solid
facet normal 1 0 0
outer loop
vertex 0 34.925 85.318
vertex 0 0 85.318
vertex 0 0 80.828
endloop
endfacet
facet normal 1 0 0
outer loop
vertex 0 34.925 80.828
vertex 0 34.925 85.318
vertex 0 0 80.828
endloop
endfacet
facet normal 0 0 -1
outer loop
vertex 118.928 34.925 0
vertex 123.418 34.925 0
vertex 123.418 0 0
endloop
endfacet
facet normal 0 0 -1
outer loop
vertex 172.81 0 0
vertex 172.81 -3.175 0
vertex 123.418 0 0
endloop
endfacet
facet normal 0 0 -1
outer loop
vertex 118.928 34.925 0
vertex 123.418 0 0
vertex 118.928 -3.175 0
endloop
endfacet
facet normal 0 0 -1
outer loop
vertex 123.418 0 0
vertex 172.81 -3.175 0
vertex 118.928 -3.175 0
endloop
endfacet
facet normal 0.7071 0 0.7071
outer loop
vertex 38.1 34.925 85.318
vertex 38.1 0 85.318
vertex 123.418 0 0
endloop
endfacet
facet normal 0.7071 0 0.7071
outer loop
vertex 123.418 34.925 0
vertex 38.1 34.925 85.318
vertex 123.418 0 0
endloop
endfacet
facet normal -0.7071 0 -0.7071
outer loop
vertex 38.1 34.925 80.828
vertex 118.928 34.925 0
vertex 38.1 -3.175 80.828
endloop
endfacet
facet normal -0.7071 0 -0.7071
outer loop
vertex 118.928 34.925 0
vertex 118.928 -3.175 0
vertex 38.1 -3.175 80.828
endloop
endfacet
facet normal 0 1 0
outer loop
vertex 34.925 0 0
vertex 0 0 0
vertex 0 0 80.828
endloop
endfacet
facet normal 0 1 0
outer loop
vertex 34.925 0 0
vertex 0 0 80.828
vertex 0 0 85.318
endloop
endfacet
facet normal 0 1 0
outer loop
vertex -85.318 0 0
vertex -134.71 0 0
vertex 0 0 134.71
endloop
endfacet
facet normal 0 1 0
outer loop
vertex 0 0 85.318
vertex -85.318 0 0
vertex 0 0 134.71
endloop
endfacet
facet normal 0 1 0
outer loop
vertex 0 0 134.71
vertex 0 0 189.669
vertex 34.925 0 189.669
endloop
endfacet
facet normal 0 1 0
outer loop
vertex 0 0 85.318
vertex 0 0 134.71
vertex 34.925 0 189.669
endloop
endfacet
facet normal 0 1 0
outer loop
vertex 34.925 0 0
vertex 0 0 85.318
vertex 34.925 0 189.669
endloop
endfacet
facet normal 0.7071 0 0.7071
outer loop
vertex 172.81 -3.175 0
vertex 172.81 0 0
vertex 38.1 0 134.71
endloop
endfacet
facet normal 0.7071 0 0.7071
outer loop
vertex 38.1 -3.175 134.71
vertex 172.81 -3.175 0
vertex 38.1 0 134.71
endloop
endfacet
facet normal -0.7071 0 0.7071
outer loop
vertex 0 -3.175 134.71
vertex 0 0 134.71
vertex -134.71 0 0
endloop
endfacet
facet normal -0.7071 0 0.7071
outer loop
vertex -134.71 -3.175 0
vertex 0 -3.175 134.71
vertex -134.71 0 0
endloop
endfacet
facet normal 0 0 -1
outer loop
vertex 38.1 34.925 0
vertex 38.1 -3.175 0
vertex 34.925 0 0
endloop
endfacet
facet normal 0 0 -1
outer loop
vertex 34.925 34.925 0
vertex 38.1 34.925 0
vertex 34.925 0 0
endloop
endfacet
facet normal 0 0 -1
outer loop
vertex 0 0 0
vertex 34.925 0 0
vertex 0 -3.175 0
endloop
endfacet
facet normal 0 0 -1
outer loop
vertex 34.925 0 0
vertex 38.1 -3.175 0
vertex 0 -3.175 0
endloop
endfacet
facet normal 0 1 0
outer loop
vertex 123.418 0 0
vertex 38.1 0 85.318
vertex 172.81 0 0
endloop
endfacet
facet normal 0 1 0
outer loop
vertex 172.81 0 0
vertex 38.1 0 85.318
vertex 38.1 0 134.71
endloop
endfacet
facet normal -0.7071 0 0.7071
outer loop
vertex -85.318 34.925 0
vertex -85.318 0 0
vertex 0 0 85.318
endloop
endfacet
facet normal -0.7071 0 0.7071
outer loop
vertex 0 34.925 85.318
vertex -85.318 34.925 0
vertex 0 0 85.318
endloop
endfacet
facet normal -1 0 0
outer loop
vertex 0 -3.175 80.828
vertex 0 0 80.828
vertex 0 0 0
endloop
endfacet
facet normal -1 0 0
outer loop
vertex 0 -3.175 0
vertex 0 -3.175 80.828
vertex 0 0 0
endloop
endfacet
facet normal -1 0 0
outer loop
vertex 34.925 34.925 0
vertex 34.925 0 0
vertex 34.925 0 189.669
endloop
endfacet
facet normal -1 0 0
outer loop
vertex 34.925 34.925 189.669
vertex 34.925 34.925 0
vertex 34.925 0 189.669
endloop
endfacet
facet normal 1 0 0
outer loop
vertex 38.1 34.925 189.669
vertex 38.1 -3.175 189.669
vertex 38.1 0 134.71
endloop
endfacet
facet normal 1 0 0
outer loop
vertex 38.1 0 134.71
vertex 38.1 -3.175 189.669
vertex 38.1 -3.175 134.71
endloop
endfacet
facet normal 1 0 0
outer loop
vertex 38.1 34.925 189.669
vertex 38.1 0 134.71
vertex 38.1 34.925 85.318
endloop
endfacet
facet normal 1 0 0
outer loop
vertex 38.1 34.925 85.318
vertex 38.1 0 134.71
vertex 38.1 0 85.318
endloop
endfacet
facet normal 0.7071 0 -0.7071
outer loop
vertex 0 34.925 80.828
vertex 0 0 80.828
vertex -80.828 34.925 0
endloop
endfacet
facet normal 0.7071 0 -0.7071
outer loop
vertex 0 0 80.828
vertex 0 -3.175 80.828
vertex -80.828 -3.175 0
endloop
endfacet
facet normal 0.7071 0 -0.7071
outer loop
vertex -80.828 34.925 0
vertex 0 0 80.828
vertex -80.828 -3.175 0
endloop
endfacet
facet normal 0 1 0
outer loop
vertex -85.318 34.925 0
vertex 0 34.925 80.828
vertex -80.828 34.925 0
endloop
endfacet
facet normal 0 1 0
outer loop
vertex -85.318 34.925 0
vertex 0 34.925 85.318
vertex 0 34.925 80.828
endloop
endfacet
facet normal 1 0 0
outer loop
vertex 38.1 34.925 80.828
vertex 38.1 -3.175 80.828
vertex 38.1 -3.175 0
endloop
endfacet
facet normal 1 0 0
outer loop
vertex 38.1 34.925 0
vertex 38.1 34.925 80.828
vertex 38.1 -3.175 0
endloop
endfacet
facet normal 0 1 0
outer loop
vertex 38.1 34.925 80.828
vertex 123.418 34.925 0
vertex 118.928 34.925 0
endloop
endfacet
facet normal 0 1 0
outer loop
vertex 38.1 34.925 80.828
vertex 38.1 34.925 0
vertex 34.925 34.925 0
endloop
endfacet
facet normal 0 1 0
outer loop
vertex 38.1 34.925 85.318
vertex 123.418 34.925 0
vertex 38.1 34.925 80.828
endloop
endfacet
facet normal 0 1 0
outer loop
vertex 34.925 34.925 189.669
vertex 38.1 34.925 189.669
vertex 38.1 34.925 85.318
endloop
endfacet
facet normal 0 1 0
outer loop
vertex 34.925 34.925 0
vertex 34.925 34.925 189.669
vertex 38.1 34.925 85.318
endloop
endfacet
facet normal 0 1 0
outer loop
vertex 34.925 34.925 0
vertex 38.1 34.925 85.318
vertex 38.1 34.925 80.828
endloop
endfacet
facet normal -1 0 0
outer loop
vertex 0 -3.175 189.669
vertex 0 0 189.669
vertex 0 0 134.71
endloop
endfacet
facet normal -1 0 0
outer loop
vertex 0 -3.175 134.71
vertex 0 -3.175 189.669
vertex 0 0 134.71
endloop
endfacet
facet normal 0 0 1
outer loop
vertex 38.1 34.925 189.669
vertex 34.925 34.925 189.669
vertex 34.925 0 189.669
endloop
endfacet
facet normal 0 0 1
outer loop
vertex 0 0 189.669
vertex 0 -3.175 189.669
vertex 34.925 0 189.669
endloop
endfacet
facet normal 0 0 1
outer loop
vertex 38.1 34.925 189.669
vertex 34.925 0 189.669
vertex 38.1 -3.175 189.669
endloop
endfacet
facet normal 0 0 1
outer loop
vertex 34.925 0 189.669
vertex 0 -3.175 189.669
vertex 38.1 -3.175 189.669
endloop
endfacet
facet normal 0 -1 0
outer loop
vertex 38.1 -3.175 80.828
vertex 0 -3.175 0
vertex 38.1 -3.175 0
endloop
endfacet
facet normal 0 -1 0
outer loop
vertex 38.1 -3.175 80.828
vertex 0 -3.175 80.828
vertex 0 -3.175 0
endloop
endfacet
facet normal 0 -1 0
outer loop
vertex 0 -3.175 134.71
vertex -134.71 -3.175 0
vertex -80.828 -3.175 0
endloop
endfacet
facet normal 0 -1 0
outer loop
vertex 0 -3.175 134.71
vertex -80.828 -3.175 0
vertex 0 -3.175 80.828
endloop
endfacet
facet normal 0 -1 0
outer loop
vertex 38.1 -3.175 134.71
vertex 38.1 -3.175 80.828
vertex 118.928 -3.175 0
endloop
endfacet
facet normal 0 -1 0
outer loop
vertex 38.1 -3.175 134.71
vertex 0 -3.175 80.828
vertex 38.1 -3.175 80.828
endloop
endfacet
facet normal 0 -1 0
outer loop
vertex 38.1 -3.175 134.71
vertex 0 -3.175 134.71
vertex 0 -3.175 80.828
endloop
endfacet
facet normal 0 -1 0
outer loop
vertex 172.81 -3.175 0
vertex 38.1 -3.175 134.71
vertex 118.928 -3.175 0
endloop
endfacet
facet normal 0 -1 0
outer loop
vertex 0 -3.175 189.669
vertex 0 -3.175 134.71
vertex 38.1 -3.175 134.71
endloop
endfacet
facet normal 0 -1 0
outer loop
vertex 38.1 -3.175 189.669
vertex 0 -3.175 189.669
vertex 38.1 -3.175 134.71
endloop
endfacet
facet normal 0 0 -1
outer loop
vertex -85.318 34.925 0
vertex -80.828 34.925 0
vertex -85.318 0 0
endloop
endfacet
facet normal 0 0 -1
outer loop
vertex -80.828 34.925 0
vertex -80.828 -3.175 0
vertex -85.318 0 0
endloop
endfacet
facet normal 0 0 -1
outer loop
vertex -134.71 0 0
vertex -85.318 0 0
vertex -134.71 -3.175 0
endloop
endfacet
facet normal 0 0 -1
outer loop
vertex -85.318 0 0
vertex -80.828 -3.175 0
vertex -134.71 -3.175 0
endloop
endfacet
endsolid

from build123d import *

# Parameters (mm, degrees)
F1_DEPTH = 3.175
F3_DEPTH = 34.925
F5_DEPTH = 34.925
F7_DEPTH = 34.925


with BuildPart() as f1:
    # F0 (on Front) → F1 (new body)
    with BuildSketch(Plane.XZ):
        Polygon((0, 80.828254), (0, 0), (38.1, 0), (38.1, 80.828254), (38.1, 134.70979), (38.1, 189.66895), (0, 189.66895), (0, 134.70979), align=None)
        Polygon((-80.828254, 0), (0, 80.828254), (0, 134.70979), (-134.70979, 0), align=None)
        Polygon((38.1, 134.70979), (38.1, 80.828254), (118.928254, 0), (172.80979, 0), align=None)
    extrude(amount=F1_DEPTH)

    # F2 (on face) → F3 (join)
    with BuildSketch(Plane(origin=(0, 0, 0), x_dir=(-1, 0, 0), z_dir=(0, 1, 0))):
        Polygon((-38.1, 80.828254), (-38.1, 0), (-34.925, 0), (-34.925, 189.66895), (-38.1, 189.66895), (-38.1, 134.70979), align=None)
    extrude(amount=F3_DEPTH)

    # F4 (on face) → F5 (join)
    with BuildSketch(Plane(origin=(0, 0, 0), x_dir=(-1, 0, 0), z_dir=(0, 1, 0))):
        Polygon((-123.418382, 0), (-118.928254, 0), (-38.1, 80.828254), (-38.1, 85.318382), align=None)
    extrude(amount=F5_DEPTH)

    # F6 (on face) → F7 (join)
    with BuildSketch(Plane(origin=(0, 0, 0), x_dir=(-1, 0, 0), z_dir=(0, 1, 0))):
        Polygon((0, 80.828254), (80.828254, 0), (85.318382, 0), (0, 85.318382), align=None)
    extrude(amount=F7_DEPTH)


solid = f1.part
